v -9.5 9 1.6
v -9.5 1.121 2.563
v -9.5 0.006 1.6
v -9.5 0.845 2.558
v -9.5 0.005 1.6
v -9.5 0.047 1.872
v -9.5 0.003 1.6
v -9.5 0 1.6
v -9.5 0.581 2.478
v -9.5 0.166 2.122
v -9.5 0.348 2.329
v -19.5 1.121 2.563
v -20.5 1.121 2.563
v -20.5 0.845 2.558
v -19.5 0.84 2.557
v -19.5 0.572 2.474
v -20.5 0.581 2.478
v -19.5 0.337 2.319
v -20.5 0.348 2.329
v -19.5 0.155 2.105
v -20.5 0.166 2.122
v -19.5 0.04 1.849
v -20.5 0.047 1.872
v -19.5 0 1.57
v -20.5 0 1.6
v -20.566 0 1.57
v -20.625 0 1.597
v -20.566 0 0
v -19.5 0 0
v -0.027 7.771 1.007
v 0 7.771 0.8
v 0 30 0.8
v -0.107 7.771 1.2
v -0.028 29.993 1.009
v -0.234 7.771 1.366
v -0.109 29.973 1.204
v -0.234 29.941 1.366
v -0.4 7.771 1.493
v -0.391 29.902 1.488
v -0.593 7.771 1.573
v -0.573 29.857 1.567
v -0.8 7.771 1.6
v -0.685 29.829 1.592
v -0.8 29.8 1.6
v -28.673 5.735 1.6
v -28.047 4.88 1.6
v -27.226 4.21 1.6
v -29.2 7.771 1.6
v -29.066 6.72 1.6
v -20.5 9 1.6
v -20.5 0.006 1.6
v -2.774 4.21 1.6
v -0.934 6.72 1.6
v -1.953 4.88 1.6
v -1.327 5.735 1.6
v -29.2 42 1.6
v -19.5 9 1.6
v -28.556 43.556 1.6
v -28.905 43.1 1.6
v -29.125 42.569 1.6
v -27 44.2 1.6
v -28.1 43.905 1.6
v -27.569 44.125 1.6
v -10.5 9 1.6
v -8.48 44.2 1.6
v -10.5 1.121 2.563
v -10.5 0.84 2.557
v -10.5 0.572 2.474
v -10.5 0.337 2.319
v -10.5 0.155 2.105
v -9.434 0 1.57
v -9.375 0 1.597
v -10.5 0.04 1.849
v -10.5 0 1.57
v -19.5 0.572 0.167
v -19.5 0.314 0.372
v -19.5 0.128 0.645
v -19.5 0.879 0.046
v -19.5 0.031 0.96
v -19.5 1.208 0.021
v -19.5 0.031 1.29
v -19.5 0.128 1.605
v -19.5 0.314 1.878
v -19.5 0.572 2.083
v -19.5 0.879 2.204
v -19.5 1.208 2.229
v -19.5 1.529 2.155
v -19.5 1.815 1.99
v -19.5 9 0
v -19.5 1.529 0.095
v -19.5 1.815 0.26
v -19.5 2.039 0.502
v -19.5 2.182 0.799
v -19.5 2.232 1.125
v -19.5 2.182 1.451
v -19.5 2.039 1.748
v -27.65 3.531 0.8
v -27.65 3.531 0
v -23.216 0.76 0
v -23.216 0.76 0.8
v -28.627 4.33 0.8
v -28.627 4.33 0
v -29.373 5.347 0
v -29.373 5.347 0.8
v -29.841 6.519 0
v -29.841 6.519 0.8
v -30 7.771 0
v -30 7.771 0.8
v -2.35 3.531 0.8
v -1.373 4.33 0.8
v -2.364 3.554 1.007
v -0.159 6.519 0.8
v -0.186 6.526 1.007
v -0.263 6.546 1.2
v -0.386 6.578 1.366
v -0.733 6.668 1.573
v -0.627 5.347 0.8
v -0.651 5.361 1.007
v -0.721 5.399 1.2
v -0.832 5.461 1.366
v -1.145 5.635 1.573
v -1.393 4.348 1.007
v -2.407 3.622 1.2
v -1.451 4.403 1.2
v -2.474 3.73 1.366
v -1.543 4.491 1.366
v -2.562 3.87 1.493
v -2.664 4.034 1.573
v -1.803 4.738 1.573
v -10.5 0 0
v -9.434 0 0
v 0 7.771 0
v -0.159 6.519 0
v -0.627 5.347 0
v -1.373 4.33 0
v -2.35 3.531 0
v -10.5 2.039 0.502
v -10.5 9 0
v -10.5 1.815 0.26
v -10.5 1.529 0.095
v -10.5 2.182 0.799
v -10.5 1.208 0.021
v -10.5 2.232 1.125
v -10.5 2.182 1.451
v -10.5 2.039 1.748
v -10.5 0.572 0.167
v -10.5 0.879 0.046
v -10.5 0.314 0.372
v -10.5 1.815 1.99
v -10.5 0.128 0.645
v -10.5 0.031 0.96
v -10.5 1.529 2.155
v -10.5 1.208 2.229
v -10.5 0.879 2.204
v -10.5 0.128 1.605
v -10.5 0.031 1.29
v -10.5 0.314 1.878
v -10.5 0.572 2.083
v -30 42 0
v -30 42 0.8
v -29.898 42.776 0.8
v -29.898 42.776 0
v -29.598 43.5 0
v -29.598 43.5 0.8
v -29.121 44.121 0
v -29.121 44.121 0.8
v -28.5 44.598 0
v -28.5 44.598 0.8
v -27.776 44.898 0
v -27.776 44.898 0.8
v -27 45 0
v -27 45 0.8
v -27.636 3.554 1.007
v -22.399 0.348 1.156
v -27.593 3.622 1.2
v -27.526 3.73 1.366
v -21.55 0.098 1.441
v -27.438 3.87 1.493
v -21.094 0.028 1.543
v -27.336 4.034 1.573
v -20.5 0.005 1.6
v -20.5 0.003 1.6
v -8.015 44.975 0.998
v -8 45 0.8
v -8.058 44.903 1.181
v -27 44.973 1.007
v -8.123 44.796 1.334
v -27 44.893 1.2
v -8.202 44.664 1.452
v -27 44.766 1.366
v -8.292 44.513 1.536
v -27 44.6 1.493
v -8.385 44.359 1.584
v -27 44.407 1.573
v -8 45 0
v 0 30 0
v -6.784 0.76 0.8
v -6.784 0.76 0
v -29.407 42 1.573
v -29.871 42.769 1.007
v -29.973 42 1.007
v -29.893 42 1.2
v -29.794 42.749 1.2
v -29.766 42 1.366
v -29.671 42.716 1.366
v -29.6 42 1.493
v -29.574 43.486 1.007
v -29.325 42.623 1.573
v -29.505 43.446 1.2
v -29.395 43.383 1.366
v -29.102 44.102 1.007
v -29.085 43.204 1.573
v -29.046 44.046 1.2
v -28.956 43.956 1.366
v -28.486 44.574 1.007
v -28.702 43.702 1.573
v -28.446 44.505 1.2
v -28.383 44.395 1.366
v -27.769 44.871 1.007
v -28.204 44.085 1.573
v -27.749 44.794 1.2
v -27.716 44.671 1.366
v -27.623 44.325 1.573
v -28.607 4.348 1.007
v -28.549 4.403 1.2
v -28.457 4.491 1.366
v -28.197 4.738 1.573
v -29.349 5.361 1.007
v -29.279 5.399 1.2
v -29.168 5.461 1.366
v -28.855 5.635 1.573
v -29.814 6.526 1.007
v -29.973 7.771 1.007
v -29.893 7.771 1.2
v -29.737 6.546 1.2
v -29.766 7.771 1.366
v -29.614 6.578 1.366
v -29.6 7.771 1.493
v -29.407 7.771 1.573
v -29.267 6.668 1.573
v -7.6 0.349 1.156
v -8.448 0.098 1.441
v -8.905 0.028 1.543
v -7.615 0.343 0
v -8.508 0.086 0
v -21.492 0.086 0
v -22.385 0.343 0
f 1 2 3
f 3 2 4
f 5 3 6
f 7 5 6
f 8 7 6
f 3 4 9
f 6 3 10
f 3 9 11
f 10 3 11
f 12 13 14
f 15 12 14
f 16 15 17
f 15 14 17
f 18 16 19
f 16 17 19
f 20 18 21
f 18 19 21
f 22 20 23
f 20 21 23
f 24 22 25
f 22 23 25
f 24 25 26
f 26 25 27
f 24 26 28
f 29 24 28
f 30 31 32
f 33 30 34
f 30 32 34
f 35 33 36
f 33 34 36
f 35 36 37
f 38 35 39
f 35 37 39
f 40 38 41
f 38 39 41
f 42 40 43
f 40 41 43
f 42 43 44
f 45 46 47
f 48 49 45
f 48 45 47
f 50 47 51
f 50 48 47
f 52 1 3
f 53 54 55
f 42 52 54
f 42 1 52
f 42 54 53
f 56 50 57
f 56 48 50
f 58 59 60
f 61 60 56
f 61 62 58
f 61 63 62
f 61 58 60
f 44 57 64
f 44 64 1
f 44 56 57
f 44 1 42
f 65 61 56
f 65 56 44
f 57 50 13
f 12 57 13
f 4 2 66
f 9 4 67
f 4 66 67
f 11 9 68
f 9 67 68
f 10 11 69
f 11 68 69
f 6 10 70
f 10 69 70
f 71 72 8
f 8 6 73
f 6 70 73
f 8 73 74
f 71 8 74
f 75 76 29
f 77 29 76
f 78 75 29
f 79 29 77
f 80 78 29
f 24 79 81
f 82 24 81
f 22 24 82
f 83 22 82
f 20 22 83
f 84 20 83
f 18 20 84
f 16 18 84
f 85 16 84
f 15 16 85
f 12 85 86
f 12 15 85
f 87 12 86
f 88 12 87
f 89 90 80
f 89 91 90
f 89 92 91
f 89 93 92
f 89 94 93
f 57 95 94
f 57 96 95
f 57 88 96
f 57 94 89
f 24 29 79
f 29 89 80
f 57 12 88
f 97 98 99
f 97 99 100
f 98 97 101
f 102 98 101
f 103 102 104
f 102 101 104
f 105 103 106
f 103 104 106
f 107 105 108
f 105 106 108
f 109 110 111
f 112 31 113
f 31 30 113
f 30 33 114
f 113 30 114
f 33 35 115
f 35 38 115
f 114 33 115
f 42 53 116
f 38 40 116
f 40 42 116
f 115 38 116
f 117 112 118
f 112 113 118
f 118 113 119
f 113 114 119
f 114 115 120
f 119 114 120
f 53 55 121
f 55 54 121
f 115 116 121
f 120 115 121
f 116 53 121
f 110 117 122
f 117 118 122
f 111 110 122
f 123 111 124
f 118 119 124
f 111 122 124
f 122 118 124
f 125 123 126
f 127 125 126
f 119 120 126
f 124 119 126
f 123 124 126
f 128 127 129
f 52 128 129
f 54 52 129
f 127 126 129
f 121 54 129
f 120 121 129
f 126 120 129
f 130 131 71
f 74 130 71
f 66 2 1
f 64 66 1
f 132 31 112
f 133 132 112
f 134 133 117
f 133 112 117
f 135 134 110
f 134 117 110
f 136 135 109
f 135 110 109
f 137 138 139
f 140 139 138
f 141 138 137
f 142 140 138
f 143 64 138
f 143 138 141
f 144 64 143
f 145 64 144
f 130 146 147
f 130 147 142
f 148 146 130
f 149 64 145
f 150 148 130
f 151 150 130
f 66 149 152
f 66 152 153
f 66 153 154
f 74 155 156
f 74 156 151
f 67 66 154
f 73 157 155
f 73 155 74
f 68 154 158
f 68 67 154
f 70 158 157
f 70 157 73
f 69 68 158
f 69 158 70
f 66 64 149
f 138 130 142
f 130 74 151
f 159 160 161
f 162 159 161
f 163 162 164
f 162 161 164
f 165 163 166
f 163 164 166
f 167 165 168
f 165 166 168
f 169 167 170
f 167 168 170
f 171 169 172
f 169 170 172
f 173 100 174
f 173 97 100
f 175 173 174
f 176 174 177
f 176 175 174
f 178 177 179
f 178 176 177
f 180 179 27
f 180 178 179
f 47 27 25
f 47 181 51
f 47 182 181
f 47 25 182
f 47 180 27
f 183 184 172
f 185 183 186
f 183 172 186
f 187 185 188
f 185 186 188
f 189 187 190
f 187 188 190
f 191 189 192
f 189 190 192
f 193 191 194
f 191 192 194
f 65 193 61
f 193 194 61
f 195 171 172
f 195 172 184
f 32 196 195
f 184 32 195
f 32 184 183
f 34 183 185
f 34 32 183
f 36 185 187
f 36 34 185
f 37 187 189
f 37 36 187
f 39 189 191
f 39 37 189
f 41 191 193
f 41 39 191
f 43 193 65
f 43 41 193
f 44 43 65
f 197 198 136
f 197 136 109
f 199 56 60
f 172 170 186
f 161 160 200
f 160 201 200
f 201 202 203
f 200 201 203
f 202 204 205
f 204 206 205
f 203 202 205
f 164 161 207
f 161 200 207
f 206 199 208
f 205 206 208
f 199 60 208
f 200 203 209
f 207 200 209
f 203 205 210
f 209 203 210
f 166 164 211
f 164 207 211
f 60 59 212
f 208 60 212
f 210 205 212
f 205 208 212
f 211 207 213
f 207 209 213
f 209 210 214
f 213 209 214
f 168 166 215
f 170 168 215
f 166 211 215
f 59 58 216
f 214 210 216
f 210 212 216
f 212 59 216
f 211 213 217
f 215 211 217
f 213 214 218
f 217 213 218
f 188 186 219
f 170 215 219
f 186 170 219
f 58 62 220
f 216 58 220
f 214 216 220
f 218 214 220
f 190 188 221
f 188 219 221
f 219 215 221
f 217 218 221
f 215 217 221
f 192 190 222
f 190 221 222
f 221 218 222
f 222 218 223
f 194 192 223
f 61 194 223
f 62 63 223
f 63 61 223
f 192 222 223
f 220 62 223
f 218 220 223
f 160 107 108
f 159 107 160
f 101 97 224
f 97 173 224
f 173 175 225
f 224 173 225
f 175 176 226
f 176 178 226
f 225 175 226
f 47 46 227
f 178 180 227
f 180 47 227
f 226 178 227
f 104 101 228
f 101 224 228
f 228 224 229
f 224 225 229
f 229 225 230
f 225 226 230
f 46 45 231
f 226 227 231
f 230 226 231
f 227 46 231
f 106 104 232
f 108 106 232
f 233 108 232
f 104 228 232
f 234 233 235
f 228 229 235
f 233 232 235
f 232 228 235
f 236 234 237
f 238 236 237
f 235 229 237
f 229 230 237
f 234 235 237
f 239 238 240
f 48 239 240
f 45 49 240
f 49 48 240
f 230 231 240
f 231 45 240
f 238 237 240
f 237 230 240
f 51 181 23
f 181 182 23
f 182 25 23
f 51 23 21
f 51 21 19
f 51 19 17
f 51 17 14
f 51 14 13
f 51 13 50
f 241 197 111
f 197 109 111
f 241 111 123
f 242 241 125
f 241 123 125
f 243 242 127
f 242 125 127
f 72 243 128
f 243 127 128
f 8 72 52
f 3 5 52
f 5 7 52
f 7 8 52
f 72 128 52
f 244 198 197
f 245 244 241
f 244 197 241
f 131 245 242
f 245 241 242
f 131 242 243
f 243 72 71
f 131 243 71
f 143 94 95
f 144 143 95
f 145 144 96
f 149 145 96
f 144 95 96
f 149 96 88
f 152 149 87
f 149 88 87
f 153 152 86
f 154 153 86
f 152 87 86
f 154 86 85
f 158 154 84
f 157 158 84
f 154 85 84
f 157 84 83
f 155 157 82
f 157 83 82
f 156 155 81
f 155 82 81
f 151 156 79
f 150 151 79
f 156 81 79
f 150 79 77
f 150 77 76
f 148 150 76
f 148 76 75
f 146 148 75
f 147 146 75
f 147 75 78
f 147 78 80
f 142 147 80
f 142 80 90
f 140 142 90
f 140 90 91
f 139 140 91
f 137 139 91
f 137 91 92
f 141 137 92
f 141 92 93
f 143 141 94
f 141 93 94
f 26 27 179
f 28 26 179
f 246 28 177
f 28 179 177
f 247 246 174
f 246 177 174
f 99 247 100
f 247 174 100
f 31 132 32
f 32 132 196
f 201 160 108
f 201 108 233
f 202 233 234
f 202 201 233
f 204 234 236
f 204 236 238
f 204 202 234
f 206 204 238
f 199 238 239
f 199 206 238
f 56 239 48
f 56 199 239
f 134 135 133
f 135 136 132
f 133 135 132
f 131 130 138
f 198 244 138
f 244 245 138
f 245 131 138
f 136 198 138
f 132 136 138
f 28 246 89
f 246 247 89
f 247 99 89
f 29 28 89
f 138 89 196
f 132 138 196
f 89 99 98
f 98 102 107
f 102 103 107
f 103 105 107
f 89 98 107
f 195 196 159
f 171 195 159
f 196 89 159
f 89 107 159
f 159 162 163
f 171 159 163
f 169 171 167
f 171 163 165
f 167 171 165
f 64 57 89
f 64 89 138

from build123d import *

# Parameters (mm, degrees)
F0_W          = 30
F0_H          = 45
F1_DEPTH      = 1.6
F2_SIZE2      = 8
F2_SIZE       = 5
F2_2_SIZE2    = 8
F2_2_SIZE     = 5
F3_R          = 3
F5_DEPTH      = 1.6
F6_W          = 11
F6_H          = 9
F7_DEPTH      = 2
F8_R          = 5
F10_DEPTH     = 1
F11_T1_DEPTH  = 6.6483183522
F13_DEPTH     = 1
F14_T1_DEPTH  = 6.6483183522
F16_T1_DEPTH  = 34.2287617925
F16_T3_DEPTH  = 24.2287617925
F16_T5_DEPTH  = 21
F16_T7_DEPTH  = 21
F16_T12_DEPTH = 8.6287617925
F16_T17_DEPTH = 8.6287617925
F16_T20_ANGLE = 57.9946167919
F16_T22_ANGLE = 90
F16_T24_ANGLE = 57.9946167919
F15_R         = 1.1066061355
F17_DEPTH     = 9


# Not quite as in the source:
# - a fillet or chamfer that OpenCascade refuses, or shapes differently, is made with other operations: its cross-section is extruded or revolved along the edge and cut away or added


with BuildPart() as f1:
    # F0 (on Top) → F1 (new body)
    with BuildSketch(Plane.XY):
        with Locations((-15, 22.5)):
            Rectangle(F0_W, F0_H)
    extrude(amount=F1_DEPTH)

    # F2
    f2_edges = [f1.edges().sort_by_distance(p)[0] for p in [
        (0, 0, 0.8),
    ]]
    f2_side = f1.faces().sort_by_distance((0, 22.5, 0.8))[0]
    chamfer(f2_edges, length=F2_SIZE, length2=F2_SIZE2, reference=f2_side)

    # F2#2
    f2_2_edges = [f1.edges().sort_by_distance(p)[0] for p in [
        (-30, 0, 0.8),
    ]]
    f2_2_side = f1.faces().sort_by_distance((-30, 22.5, 0.8))[0]
    chamfer(f2_2_edges, length=F2_2_SIZE, length2=F2_2_SIZE2, reference=f2_2_side)

    # F3
    f3_edges = [f1.edges().sort_by_distance(p)[0] for p in [
        (0, 45, 0.8),
        (-30, 45, 0.8),
    ]]
    fillet(f3_edges, radius=F3_R)

    # F4 (on face) → F5 (cut)
    with BuildSketch(Plane(origin=(0, 0, 0), x_dir=(1, 0, 0), z_dir=(0, 0, -1))):
        Polygon((0, -45), (0, -30), (-8, -45), align=None)
    extrude(amount=-F5_DEPTH, mode=Mode.SUBTRACT)

    # F6 (on face) → F7 (cut)
    with BuildSketch(Plane.XY.offset(1.6)):
        with Locations((-15, 4.5)):
            Rectangle(F6_W, F6_H)
    extrude(amount=-F7_DEPTH, mode=Mode.SUBTRACT)

    # F8
    f8_edges = [f1.edges().sort_by_distance(p)[0] for p in [
        (0, 5, 0.8),
        (-8, 0, 0.8),
        (-22, 0, 0.8),
        (-30, 5, 0.8),
    ]]
    fillet(f8_edges, radius=F8_R)

    # F9 (on face) → F10 (join)
    with BuildSketch(Plane(origin=(-9.5, 0, 0), x_dir=(0, -1, 0), z_dir=(-1, 0, 0))):
        Polygon((0, 2.7), (-9, 1.6), (-9, 0), (0, 0), align=None)
    extrude(amount=F10_DEPTH)

    # F11: fillet of radius 1 on 1 edges, made by hand

    # F11_s2 → F11_t1 (cut)
    with BuildSketch(Plane.YZ.offset(-13.3241591761)):
        with BuildLine():
            ThreePointArc((1.12131943, 2.5629498474), (0.3371725073, 2.3191084678), (0, 1.5703363296))
            Line((0, 1.5703363296), (0, 2.7))
            Line((0, 2.7), (1.12131943, 2.5629498474))
        make_face()
    extrude(amount=F11_T1_DEPTH, mode=Mode.SUBTRACT)

    # F12 (on face) → F13 (join)
    with BuildSketch(Plane.YZ.offset(-20.5)):
        Polygon((0, 2.7), (0, 0), (9, 0), (9, 1.6), align=None)
    extrude(amount=F13_DEPTH)

    # F14: fillet of radius 1 on 1 edges, made by hand

    # F14_s2 → F14_t1 (cut)
    with BuildSketch(Plane.YZ.offset(-23.3241591761)):
        with BuildLine():
            ThreePointArc((1.12131943, 2.5629498474), (0.3371725073, 2.3191084678), (0, 1.5703363296))
            Line((0, 1.5703363296), (0, 2.7))
            Line((0, 2.7), (1.12131943, 2.5629498474))
        make_face()
    extrude(amount=F14_T1_DEPTH, mode=Mode.SUBTRACT)

    # F16: fillet of radius 0.8 on 9 edges, made by hand

    # F16_s2 → F16_t1 (cut)
    with BuildSketch(Plane.XZ.offset(-42)):
        with BuildLine():
            ThreePointArc((-30, 0.8), (-29.7656854249, 1.3656854249), (-29.2, 1.6))
            Line((-29.2, 1.6), (-30, 1.6))
            Line((-30, 1.6), (-30, 0.8))
        make_face()
    extrude(amount=F16_T1_DEPTH, mode=Mode.SUBTRACT)

    # F16_s4 → F16_t3 (cut)
    with BuildSketch(Plane.XZ.offset(-32)):
        with BuildLine():
            ThreePointArc((0, 0.8), (-0.2343145751, 1.3656854249), (-0.8, 1.6))
            Line((-0.8, 1.6), (0, 1.6))
            Line((0, 1.6), (0, 0.8))
        make_face()
    extrude(amount=F16_T3_DEPTH, mode=Mode.SUBTRACT)

    # F16_s6 → F16_t5 (cut)
    with BuildSketch(Plane.YZ.offset(-27)):
        with BuildLine():
            ThreePointArc((45, 0.8), (44.7656854249, 1.3656854249), (44.2, 1.6))
            Line((44.2, 1.6), (45, 1.6))
            Line((45, 1.6), (45, 0.8))
        make_face()
    extrude(amount=F16_T5_DEPTH, mode=Mode.SUBTRACT)

    # F16_s8 → F16_t7 (cut)
    with BuildSketch(Plane(origin=(-11.5155709343, 21.5916955017, 0), x_dir=(0, 0, 1), z_dir=(-0.4705882353, 0.8823529412, 0))):
        with BuildLine():
            ThreePointArc((0.8, 14.1176470588), (1.3656854249, 13.8833324838), (1.6, 13.3176470588))
            Line((1.6, 13.3176470588), (1.6, 14.1176470588))
            Line((1.6, 14.1176470588), (0.8, 14.1176470588))
        make_face()
    extrude(amount=F16_T7_DEPTH, mode=Mode.SUBTRACT)


with BuildPart() as f16_tool10:
    # F16_s11 → F16_t12 (new body)
    with BuildSketch(Plane(origin=(-21.4702194191, 13.4188871369, 0), x_dir=(0, 0, 1), z_dir=(0.847998304, -0.52999894, 0))):
        with BuildLine():
            ThreePointArc((0.8, 11.6599766801), (1.3656854249, 11.425662105), (1.6, 10.8599766801))
            Line((1.6, 10.8599766801), (1.6, 11.6599766801))
            Line((1.6, 11.6599766801), (0.8, 11.6599766801))
        make_face()
    extrude(amount=F16_T12_DEPTH)

    split(bisect_by=Plane.YZ.offset(-20.5), keep=Keep.BOTTOM)


with BuildPart() as f1_1:
    add(f1.part)

    # F16_t9: cut F16_tool10
    add(f16_tool10.part, mode=Mode.SUBTRACT)


with BuildPart() as f16_tool15:
    # F16_s16 → F16_t17 (new body)
    with BuildSketch(Plane(origin=(-0.1028142887, -0.0642589305, 0), x_dir=(0, 0, 1), z_dir=(-0.847998304, -0.52999894, 0))):
        with BuildLine():
            ThreePointArc((0.8, 4.23999152), (1.3656854249, 4.4743060951), (1.6, 5.03999152))
            Line((1.6, 5.03999152), (1.6, 4.23999152))
            Line((1.6, 4.23999152), (0.8, 4.23999152))
        make_face()
    extrude(amount=F16_T17_DEPTH)

    split(bisect_by=Plane.YZ.offset(-9.5), keep=Keep.TOP)


with BuildPart() as f1_2:
    add(f1_1.part)

    # F16_t14: cut F16_tool15
    add(f16_tool15.part, mode=Mode.SUBTRACT)

    # F16_s19 → F16_t20 (revolve, cut)
    with BuildSketch(Plane.XZ.offset(-7.7712382075)):
        with BuildLine():
            ThreePointArc((0, 0.8), (-0.2343145751, 1.3656854249), (-0.8, 1.6))
            Line((-0.8, 1.6), (0, 1.6))
            Line((0, 1.6), (0, 0.8))
        make_face()
    revolve(axis=Axis((-5, 7.7712382075, 1.6), (0, 0, -1)), revolution_arc=F16_T20_ANGLE, mode=Mode.SUBTRACT)

    # F16_s21 → F16_t22 (revolve, cut)
    with BuildSketch(Plane.XZ.offset(-42)):
        with BuildLine():
            ThreePointArc((-30, 0.8), (-29.7656854249, 1.3656854249), (-29.2, 1.6))
            Line((-29.2, 1.6), (-30, 1.6))
            Line((-30, 1.6), (-30, 0.8))
        make_face()
    revolve(axis=Axis((-27, 42, 1.6), (0, 0, -1)), revolution_arc=F16_T22_ANGLE, mode=Mode.SUBTRACT)

    # F16_s23 → F16_t24 (revolve, cut)
    with BuildSketch(Plane(origin=(-21.4702194191, 13.4188871369, 0), x_dir=(0, 0, 1), z_dir=(0.847998304, -0.52999894, 0))):
        with BuildLine():
            ThreePointArc((0.8, 11.6599766801), (1.3656854249, 11.425662105), (1.6, 10.8599766801))
            Line((1.6, 10.8599766801), (1.6, 11.6599766801))
            Line((1.6, 11.6599766801), (0.8, 11.6599766801))
        make_face()
    revolve(axis=Axis((-25, 7.7712382075, 1.6), (0, 0, -1)), revolution_arc=F16_T24_ANGLE, mode=Mode.SUBTRACT)

    # F15 (on face) → F17 (join)
    with BuildSketch(Plane.YZ.offset(-19.5)):
        with Locations((1.125, 1.125)):
            Circle(F15_R)
    extrude(amount=F17_DEPTH)


solid = f1_2.part
